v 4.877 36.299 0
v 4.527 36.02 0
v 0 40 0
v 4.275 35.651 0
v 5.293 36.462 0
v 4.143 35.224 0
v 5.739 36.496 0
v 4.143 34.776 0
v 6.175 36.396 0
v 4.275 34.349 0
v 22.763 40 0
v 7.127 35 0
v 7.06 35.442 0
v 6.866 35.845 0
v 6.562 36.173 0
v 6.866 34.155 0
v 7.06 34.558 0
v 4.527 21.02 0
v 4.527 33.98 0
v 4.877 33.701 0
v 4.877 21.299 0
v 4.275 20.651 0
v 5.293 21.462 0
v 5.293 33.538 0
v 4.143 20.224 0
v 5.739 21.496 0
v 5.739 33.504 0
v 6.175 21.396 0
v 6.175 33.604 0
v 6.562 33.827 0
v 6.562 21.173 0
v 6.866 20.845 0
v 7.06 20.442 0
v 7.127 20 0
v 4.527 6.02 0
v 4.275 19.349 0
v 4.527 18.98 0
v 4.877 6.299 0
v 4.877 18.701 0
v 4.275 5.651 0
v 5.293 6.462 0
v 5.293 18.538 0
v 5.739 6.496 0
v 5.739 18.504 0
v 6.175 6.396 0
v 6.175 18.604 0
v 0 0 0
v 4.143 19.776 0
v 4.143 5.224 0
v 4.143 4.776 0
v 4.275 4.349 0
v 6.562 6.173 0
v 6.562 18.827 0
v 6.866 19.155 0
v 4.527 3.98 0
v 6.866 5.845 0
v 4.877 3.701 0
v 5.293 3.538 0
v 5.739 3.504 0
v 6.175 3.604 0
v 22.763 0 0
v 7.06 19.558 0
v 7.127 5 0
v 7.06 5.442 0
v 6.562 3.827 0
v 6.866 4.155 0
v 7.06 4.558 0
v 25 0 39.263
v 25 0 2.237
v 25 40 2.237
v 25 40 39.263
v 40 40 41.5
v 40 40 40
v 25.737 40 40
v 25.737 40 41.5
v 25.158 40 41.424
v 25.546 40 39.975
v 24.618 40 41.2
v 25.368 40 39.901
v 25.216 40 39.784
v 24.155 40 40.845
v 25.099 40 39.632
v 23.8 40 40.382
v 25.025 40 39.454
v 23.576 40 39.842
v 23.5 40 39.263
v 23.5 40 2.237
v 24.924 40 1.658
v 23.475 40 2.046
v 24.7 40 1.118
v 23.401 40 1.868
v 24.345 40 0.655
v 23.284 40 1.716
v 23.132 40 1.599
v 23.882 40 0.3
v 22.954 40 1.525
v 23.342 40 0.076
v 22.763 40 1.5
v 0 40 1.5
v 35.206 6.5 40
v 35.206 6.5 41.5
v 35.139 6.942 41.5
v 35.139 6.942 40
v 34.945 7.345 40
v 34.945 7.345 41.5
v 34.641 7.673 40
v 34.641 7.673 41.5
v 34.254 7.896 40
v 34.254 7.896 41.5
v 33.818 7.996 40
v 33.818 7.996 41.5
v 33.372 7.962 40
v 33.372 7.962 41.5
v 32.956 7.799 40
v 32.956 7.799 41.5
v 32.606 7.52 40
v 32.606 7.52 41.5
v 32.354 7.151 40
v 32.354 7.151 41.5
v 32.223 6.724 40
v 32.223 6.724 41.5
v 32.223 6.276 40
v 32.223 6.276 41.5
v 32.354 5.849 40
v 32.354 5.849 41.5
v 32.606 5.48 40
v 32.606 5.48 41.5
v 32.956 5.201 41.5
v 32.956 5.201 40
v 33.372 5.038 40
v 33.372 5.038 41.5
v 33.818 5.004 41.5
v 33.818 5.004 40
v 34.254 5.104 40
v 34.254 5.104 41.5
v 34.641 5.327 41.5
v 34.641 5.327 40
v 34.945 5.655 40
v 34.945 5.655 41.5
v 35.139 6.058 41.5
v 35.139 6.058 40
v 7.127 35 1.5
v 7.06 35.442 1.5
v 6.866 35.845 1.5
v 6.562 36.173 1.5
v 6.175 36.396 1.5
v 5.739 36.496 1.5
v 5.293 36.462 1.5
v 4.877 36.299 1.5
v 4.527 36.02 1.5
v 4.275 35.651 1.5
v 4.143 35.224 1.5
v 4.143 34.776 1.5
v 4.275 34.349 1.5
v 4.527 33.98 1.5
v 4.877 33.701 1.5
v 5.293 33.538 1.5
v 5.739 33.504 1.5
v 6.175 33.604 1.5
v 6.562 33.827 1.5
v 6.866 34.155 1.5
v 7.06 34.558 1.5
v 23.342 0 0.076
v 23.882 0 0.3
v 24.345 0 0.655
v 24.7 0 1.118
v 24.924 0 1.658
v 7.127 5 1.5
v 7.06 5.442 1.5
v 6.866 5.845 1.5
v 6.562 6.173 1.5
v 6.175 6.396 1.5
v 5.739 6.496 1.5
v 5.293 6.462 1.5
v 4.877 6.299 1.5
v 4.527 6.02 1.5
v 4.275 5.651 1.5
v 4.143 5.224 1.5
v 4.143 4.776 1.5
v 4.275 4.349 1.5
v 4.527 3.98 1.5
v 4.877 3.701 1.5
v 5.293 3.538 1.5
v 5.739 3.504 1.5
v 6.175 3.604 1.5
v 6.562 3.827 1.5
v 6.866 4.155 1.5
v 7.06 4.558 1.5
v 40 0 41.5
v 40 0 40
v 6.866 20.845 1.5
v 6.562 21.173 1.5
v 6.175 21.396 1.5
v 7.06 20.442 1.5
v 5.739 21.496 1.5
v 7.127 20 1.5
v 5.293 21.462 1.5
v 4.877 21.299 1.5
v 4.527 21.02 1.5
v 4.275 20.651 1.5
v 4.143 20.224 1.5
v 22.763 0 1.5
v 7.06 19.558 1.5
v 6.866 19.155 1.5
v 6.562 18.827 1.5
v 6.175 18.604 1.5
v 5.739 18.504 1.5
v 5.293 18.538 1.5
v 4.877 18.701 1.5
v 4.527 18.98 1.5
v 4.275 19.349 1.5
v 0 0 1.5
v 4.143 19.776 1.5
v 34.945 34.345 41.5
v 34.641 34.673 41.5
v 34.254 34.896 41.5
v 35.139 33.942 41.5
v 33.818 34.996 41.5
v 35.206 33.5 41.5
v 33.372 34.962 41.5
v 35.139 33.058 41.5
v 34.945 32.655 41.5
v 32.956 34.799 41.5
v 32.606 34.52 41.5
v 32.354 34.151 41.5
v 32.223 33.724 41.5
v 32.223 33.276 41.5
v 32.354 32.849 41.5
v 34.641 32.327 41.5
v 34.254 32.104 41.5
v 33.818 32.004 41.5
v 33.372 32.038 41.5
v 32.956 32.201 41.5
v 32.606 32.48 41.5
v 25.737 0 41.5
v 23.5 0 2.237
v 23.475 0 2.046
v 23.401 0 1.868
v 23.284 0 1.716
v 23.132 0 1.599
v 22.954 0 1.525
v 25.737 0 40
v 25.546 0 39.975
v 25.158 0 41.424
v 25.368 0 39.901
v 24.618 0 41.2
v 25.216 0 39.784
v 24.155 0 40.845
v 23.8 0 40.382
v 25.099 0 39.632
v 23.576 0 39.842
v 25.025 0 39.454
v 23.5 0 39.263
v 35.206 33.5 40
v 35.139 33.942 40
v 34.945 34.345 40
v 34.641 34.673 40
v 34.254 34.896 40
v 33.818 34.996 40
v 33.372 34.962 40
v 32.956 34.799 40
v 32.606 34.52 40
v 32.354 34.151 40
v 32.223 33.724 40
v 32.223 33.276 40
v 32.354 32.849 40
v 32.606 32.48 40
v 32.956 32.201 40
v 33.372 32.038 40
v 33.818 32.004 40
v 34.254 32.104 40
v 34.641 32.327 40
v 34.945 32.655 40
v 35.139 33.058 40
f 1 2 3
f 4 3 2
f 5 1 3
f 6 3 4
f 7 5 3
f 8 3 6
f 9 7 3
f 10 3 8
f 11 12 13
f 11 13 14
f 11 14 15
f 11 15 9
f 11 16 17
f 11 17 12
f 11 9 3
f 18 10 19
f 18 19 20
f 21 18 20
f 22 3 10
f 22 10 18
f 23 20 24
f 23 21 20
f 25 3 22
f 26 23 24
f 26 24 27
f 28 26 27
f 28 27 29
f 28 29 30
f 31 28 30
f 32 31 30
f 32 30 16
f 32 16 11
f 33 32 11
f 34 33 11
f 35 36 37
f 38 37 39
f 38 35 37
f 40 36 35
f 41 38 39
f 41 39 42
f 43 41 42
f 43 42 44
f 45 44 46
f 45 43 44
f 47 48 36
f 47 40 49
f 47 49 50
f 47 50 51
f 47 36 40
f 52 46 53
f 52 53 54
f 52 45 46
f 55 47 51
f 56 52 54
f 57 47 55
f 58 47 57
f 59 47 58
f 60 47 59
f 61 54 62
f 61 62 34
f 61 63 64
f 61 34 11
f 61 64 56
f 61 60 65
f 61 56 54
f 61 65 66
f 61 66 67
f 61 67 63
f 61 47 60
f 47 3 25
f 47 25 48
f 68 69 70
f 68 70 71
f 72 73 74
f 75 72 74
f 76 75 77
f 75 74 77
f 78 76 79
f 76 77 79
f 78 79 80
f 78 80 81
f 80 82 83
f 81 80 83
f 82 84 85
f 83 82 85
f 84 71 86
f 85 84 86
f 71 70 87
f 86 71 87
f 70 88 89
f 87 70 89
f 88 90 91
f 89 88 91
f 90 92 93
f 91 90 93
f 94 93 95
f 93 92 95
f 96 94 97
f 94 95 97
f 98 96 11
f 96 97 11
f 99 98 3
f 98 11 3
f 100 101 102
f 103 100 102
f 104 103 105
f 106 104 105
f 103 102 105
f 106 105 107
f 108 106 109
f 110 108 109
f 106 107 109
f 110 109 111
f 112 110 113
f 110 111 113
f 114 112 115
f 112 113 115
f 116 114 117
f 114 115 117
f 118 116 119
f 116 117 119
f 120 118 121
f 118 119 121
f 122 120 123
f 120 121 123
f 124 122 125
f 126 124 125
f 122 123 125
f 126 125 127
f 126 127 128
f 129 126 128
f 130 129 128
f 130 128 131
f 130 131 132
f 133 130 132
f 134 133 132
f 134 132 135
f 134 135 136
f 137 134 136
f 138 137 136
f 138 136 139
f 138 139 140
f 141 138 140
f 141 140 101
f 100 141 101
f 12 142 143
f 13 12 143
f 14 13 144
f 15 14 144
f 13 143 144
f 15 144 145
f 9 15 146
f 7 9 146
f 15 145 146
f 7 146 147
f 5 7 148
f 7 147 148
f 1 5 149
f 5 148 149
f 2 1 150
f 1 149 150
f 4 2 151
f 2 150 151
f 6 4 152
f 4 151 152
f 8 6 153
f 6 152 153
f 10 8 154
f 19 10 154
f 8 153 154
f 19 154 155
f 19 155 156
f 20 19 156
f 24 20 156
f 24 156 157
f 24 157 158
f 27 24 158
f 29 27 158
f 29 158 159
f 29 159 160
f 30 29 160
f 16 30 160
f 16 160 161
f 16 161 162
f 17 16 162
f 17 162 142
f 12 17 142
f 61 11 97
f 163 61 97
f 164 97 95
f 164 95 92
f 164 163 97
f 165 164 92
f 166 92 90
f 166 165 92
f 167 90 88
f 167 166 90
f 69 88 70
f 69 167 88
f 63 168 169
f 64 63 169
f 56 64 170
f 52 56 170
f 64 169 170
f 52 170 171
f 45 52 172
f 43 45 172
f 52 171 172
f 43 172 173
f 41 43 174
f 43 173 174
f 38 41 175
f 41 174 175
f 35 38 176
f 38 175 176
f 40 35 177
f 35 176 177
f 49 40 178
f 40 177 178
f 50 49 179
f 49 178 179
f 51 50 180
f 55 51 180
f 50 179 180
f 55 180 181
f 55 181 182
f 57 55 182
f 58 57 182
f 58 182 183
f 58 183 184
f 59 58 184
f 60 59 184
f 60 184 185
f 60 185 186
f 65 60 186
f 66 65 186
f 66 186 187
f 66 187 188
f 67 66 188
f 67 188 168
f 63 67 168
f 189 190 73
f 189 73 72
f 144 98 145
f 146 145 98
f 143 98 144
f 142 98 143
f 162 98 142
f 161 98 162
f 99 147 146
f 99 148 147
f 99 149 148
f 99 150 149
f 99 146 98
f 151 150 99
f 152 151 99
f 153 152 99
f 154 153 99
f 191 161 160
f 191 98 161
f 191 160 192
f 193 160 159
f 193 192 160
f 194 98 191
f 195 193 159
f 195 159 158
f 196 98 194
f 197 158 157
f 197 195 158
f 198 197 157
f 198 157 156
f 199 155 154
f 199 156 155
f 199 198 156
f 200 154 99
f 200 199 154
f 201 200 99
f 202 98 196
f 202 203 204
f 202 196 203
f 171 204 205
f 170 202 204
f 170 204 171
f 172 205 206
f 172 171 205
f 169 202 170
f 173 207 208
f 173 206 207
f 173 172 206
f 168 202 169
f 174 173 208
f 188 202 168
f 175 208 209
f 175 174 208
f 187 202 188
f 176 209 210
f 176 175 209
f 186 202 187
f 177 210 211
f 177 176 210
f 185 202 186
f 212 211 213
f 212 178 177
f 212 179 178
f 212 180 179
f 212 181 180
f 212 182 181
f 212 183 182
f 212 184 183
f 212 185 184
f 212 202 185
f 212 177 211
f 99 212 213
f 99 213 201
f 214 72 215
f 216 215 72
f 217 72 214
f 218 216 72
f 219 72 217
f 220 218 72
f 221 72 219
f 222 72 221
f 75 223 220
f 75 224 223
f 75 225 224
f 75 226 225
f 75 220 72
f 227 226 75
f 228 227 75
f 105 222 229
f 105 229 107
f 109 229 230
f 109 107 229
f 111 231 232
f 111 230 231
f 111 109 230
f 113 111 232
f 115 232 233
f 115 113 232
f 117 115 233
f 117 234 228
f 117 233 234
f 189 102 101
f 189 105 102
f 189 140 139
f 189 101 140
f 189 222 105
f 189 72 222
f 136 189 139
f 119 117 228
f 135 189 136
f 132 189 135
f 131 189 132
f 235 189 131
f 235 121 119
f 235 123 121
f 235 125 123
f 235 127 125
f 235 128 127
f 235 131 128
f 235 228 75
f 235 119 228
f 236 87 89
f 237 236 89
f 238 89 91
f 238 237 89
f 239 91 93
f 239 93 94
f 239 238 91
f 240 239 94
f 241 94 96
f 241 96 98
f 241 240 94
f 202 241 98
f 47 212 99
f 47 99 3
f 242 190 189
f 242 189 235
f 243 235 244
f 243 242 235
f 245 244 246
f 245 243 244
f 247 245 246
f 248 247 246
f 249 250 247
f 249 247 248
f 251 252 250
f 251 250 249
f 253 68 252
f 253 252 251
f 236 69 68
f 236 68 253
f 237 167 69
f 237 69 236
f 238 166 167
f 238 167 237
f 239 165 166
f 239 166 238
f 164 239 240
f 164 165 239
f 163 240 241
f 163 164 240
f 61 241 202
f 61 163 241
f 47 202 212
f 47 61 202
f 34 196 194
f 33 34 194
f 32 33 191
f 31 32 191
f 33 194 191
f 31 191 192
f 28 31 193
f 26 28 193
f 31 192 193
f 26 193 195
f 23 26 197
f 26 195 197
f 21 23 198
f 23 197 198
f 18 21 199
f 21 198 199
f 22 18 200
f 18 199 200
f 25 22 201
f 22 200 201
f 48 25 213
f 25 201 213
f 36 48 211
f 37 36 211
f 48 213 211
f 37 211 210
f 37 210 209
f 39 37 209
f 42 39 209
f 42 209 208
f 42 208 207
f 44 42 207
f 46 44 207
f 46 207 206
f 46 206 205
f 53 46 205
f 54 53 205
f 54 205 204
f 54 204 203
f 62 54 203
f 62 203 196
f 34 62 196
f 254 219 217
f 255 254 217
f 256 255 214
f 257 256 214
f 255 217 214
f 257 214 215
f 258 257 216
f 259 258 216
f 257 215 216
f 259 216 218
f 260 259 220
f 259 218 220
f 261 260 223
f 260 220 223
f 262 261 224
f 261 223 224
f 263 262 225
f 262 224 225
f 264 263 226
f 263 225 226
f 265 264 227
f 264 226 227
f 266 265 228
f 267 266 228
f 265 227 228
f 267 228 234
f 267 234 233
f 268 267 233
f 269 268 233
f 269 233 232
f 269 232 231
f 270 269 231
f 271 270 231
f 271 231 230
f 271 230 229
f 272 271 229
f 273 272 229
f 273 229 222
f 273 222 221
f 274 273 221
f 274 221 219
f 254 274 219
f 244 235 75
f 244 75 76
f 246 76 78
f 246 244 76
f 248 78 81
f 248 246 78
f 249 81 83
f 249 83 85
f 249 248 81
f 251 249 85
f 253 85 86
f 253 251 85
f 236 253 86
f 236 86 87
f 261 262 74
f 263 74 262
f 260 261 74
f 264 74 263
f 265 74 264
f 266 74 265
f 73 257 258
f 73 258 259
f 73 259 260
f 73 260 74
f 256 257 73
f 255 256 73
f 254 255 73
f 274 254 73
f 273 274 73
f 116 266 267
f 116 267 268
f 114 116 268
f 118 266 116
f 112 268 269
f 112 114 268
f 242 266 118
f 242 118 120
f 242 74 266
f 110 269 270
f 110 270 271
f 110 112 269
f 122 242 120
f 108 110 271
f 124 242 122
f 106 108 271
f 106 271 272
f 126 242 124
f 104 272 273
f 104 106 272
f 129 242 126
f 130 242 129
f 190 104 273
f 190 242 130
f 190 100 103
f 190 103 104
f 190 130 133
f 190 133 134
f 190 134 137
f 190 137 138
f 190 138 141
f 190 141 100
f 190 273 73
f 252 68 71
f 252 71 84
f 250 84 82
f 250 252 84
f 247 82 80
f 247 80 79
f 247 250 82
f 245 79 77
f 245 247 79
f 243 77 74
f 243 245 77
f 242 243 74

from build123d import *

# Parameters (mm, degrees)
BASE_FLANGE1_DEPTH          = 40
F_3_0MM_PRESS_DOWEL_HOLE1_D = 3
F_3_0MM_PRESS_DOWEL_HOLE2_D = 3


# Sheet-metal steps are written as plain solids
with BuildPart() as part:
    # Sketch1 → Base-Flange1 (new body)
    with BuildSketch(Plane(origin=(0, 0, 0), x_dir=(1, 0, 0), z_dir=(0, 1, 0))):
        with BuildLine():
            Line((0, 0), (22.7634, 0))
            ThreePointArc((22.7634, 0), (24.344915027, -0.655084973), (25, -2.2366))
            Line((25, -2.2366), (25, -39.2634))
            ThreePointArc((25, -39.2634), (25.215745145, -39.784254855), (25.7366, -40))
            Line((25.7366, -40), (40, -40))
            Line((40, -40), (40, -41.5))
            Line((40, -41.5), (25.7366, -41.5))
            ThreePointArc((25.7366, -41.5), (24.155084973, -40.844915027), (23.5, -39.2634))
            Line((23.5, -39.2634), (23.5, -2.2366))
            ThreePointArc((23.5, -2.2366), (23.284254855, -1.715745145), (22.7634, -1.5))
            Line((22.7634, -1.5), (0, -1.5))
            Line((0, -1.5), (0, 0))
        make_face()
    extrude(amount=BASE_FLANGE1_DEPTH)

    # Ø3.0mm Press Dowel Hole1 (through all)
    with Locations(Plane(origin=(0, 0, 40), x_dir=(-1, 0, 0), z_dir=(0, 0, -1))):
        with Locations((-33.705752928, 33.5), (-33.705752928, 6.5)):
            Hole(F_3_0MM_PRESS_DOWEL_HOLE1_D / 2)

    # Ø3.0mm Press Dowel Hole2 (through all)
    with Locations(Plane(origin=(0, 0, 0), x_dir=(-1, 0, 0), z_dir=(0, 0, -1))):
        with Locations((-5.626733286, 35), (-5.626733286, 5), (-5.626733286, 20)):
            Hole(F_3_0MM_PRESS_DOWEL_HOLE2_D / 2)


solid = part.part
